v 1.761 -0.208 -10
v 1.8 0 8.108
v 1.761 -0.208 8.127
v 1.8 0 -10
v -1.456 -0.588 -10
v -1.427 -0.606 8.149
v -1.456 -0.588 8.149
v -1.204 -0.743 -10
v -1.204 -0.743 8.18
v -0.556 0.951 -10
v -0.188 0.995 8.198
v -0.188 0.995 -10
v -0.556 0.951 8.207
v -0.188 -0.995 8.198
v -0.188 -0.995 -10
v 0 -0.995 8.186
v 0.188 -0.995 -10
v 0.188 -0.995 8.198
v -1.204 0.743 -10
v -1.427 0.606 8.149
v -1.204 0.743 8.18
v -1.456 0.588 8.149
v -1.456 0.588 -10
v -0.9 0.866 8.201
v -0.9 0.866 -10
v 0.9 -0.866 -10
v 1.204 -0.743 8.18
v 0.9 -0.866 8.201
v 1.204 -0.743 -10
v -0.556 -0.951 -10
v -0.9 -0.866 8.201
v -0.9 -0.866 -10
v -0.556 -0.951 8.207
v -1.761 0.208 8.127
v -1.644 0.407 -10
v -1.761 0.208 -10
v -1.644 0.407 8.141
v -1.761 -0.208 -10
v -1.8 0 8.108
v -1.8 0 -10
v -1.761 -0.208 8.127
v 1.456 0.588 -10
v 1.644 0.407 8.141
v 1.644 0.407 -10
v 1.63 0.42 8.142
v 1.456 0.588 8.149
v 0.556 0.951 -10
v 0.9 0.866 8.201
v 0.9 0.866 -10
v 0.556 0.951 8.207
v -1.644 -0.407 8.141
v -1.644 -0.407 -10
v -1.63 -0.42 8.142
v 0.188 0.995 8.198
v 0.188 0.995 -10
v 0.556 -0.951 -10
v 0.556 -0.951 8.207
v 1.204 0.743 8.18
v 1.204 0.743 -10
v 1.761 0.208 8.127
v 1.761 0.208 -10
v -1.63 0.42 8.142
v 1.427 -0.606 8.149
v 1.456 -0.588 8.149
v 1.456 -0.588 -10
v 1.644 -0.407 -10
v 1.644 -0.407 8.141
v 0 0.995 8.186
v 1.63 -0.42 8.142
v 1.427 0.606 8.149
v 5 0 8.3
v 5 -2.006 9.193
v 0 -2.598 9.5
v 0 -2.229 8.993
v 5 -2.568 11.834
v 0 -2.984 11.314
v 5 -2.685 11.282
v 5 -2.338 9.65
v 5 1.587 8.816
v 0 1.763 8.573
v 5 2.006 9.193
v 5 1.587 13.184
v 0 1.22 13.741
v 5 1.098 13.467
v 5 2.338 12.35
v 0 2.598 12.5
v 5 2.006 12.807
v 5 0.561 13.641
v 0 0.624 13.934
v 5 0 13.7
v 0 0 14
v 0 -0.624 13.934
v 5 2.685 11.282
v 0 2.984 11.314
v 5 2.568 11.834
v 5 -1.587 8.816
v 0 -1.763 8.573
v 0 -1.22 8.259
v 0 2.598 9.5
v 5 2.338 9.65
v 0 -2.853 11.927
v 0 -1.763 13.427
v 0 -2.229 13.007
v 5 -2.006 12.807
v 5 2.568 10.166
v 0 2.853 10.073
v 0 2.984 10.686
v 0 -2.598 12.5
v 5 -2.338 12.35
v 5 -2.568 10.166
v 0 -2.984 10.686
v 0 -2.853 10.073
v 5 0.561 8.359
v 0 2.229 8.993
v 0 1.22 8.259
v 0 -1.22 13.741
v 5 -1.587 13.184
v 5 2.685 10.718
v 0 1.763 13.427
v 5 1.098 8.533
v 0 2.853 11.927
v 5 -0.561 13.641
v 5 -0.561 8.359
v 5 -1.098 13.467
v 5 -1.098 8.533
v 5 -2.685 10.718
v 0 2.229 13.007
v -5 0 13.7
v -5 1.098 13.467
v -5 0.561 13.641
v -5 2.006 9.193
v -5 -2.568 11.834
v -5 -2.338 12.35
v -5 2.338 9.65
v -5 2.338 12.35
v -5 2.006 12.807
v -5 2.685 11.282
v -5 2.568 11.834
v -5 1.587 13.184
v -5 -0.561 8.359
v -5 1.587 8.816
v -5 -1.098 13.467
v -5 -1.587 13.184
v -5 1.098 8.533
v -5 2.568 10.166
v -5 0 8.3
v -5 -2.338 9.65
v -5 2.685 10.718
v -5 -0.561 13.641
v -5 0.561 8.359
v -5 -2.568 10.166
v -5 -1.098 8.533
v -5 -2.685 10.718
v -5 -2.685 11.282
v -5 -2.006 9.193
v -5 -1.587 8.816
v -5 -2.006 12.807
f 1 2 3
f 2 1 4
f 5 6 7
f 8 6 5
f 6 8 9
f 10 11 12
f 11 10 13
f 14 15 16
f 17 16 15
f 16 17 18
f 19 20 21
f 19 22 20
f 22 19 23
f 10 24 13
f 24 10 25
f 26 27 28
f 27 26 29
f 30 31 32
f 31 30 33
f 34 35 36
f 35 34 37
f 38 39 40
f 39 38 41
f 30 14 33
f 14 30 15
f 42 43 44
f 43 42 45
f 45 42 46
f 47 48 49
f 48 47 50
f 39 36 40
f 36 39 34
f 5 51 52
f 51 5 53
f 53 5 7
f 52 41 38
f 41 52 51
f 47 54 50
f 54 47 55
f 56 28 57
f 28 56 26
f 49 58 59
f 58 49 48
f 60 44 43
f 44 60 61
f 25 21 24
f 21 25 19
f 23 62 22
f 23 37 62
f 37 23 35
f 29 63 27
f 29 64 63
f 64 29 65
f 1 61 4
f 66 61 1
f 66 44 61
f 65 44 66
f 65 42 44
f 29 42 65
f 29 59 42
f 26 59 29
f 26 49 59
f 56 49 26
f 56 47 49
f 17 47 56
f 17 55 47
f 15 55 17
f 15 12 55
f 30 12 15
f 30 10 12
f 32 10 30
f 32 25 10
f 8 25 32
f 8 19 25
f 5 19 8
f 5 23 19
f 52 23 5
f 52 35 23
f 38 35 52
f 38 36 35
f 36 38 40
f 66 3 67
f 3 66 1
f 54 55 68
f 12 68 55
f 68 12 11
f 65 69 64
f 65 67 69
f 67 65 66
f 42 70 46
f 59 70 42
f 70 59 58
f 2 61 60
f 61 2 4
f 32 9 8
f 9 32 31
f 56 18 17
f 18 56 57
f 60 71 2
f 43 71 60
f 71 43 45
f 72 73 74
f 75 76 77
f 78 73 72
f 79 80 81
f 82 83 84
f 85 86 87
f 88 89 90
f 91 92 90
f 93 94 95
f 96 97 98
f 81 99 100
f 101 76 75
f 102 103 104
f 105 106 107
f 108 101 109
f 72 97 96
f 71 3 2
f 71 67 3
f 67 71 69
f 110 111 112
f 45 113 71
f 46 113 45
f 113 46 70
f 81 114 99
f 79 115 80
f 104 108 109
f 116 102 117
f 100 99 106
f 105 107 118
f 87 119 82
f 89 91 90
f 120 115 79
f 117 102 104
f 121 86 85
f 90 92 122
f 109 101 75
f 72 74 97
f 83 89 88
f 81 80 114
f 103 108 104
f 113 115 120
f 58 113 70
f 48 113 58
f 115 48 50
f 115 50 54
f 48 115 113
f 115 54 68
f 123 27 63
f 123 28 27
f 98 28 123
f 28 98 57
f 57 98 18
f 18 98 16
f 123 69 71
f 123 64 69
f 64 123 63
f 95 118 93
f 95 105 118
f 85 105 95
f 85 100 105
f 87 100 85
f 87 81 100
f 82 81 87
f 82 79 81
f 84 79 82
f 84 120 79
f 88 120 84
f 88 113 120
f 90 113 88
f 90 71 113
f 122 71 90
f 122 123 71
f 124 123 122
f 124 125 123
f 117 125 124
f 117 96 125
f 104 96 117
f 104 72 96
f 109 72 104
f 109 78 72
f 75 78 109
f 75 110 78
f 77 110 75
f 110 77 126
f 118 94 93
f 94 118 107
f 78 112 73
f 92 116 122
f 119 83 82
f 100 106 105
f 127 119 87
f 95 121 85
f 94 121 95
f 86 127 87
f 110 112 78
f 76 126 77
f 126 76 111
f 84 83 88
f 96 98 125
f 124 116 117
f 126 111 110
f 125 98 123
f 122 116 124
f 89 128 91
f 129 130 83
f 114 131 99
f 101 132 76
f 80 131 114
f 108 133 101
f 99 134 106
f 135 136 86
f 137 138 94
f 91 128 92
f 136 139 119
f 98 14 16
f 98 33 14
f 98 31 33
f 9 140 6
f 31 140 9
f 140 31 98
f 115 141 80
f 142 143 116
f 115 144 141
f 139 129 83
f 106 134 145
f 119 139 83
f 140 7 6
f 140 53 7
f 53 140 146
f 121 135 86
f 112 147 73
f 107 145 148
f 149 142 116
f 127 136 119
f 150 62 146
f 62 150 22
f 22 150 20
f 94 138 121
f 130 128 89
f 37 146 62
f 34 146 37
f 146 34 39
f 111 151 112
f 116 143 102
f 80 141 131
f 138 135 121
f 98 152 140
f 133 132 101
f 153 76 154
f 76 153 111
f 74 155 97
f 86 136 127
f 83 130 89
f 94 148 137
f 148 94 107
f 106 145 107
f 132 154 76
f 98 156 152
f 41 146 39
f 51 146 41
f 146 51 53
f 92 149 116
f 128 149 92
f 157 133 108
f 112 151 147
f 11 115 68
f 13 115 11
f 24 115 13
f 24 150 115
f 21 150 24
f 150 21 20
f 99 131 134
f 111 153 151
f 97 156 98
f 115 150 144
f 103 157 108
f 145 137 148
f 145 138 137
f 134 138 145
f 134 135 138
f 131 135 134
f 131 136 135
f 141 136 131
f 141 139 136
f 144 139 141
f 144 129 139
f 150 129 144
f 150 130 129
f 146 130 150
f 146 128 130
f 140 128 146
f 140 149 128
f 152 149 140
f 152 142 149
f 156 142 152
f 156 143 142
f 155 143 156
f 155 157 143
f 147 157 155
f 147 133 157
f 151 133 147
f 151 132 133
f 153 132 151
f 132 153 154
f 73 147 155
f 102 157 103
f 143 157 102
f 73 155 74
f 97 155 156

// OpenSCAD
color("#cdaa7d"){
linear_extrude(20, center =true){
scale([1.8,1,1])
circle( center =true, $fn= 30);
}
}


color("#777777"){
translate([0,0,11])
rotate([0,90,0])
cylinder(5,3,2.7, $fn = 30);
}

color("#777777"){
translate([0,0,11])
rotate([0,-90,0])
cylinder(5,3,2.7, $fn = 30);
}
